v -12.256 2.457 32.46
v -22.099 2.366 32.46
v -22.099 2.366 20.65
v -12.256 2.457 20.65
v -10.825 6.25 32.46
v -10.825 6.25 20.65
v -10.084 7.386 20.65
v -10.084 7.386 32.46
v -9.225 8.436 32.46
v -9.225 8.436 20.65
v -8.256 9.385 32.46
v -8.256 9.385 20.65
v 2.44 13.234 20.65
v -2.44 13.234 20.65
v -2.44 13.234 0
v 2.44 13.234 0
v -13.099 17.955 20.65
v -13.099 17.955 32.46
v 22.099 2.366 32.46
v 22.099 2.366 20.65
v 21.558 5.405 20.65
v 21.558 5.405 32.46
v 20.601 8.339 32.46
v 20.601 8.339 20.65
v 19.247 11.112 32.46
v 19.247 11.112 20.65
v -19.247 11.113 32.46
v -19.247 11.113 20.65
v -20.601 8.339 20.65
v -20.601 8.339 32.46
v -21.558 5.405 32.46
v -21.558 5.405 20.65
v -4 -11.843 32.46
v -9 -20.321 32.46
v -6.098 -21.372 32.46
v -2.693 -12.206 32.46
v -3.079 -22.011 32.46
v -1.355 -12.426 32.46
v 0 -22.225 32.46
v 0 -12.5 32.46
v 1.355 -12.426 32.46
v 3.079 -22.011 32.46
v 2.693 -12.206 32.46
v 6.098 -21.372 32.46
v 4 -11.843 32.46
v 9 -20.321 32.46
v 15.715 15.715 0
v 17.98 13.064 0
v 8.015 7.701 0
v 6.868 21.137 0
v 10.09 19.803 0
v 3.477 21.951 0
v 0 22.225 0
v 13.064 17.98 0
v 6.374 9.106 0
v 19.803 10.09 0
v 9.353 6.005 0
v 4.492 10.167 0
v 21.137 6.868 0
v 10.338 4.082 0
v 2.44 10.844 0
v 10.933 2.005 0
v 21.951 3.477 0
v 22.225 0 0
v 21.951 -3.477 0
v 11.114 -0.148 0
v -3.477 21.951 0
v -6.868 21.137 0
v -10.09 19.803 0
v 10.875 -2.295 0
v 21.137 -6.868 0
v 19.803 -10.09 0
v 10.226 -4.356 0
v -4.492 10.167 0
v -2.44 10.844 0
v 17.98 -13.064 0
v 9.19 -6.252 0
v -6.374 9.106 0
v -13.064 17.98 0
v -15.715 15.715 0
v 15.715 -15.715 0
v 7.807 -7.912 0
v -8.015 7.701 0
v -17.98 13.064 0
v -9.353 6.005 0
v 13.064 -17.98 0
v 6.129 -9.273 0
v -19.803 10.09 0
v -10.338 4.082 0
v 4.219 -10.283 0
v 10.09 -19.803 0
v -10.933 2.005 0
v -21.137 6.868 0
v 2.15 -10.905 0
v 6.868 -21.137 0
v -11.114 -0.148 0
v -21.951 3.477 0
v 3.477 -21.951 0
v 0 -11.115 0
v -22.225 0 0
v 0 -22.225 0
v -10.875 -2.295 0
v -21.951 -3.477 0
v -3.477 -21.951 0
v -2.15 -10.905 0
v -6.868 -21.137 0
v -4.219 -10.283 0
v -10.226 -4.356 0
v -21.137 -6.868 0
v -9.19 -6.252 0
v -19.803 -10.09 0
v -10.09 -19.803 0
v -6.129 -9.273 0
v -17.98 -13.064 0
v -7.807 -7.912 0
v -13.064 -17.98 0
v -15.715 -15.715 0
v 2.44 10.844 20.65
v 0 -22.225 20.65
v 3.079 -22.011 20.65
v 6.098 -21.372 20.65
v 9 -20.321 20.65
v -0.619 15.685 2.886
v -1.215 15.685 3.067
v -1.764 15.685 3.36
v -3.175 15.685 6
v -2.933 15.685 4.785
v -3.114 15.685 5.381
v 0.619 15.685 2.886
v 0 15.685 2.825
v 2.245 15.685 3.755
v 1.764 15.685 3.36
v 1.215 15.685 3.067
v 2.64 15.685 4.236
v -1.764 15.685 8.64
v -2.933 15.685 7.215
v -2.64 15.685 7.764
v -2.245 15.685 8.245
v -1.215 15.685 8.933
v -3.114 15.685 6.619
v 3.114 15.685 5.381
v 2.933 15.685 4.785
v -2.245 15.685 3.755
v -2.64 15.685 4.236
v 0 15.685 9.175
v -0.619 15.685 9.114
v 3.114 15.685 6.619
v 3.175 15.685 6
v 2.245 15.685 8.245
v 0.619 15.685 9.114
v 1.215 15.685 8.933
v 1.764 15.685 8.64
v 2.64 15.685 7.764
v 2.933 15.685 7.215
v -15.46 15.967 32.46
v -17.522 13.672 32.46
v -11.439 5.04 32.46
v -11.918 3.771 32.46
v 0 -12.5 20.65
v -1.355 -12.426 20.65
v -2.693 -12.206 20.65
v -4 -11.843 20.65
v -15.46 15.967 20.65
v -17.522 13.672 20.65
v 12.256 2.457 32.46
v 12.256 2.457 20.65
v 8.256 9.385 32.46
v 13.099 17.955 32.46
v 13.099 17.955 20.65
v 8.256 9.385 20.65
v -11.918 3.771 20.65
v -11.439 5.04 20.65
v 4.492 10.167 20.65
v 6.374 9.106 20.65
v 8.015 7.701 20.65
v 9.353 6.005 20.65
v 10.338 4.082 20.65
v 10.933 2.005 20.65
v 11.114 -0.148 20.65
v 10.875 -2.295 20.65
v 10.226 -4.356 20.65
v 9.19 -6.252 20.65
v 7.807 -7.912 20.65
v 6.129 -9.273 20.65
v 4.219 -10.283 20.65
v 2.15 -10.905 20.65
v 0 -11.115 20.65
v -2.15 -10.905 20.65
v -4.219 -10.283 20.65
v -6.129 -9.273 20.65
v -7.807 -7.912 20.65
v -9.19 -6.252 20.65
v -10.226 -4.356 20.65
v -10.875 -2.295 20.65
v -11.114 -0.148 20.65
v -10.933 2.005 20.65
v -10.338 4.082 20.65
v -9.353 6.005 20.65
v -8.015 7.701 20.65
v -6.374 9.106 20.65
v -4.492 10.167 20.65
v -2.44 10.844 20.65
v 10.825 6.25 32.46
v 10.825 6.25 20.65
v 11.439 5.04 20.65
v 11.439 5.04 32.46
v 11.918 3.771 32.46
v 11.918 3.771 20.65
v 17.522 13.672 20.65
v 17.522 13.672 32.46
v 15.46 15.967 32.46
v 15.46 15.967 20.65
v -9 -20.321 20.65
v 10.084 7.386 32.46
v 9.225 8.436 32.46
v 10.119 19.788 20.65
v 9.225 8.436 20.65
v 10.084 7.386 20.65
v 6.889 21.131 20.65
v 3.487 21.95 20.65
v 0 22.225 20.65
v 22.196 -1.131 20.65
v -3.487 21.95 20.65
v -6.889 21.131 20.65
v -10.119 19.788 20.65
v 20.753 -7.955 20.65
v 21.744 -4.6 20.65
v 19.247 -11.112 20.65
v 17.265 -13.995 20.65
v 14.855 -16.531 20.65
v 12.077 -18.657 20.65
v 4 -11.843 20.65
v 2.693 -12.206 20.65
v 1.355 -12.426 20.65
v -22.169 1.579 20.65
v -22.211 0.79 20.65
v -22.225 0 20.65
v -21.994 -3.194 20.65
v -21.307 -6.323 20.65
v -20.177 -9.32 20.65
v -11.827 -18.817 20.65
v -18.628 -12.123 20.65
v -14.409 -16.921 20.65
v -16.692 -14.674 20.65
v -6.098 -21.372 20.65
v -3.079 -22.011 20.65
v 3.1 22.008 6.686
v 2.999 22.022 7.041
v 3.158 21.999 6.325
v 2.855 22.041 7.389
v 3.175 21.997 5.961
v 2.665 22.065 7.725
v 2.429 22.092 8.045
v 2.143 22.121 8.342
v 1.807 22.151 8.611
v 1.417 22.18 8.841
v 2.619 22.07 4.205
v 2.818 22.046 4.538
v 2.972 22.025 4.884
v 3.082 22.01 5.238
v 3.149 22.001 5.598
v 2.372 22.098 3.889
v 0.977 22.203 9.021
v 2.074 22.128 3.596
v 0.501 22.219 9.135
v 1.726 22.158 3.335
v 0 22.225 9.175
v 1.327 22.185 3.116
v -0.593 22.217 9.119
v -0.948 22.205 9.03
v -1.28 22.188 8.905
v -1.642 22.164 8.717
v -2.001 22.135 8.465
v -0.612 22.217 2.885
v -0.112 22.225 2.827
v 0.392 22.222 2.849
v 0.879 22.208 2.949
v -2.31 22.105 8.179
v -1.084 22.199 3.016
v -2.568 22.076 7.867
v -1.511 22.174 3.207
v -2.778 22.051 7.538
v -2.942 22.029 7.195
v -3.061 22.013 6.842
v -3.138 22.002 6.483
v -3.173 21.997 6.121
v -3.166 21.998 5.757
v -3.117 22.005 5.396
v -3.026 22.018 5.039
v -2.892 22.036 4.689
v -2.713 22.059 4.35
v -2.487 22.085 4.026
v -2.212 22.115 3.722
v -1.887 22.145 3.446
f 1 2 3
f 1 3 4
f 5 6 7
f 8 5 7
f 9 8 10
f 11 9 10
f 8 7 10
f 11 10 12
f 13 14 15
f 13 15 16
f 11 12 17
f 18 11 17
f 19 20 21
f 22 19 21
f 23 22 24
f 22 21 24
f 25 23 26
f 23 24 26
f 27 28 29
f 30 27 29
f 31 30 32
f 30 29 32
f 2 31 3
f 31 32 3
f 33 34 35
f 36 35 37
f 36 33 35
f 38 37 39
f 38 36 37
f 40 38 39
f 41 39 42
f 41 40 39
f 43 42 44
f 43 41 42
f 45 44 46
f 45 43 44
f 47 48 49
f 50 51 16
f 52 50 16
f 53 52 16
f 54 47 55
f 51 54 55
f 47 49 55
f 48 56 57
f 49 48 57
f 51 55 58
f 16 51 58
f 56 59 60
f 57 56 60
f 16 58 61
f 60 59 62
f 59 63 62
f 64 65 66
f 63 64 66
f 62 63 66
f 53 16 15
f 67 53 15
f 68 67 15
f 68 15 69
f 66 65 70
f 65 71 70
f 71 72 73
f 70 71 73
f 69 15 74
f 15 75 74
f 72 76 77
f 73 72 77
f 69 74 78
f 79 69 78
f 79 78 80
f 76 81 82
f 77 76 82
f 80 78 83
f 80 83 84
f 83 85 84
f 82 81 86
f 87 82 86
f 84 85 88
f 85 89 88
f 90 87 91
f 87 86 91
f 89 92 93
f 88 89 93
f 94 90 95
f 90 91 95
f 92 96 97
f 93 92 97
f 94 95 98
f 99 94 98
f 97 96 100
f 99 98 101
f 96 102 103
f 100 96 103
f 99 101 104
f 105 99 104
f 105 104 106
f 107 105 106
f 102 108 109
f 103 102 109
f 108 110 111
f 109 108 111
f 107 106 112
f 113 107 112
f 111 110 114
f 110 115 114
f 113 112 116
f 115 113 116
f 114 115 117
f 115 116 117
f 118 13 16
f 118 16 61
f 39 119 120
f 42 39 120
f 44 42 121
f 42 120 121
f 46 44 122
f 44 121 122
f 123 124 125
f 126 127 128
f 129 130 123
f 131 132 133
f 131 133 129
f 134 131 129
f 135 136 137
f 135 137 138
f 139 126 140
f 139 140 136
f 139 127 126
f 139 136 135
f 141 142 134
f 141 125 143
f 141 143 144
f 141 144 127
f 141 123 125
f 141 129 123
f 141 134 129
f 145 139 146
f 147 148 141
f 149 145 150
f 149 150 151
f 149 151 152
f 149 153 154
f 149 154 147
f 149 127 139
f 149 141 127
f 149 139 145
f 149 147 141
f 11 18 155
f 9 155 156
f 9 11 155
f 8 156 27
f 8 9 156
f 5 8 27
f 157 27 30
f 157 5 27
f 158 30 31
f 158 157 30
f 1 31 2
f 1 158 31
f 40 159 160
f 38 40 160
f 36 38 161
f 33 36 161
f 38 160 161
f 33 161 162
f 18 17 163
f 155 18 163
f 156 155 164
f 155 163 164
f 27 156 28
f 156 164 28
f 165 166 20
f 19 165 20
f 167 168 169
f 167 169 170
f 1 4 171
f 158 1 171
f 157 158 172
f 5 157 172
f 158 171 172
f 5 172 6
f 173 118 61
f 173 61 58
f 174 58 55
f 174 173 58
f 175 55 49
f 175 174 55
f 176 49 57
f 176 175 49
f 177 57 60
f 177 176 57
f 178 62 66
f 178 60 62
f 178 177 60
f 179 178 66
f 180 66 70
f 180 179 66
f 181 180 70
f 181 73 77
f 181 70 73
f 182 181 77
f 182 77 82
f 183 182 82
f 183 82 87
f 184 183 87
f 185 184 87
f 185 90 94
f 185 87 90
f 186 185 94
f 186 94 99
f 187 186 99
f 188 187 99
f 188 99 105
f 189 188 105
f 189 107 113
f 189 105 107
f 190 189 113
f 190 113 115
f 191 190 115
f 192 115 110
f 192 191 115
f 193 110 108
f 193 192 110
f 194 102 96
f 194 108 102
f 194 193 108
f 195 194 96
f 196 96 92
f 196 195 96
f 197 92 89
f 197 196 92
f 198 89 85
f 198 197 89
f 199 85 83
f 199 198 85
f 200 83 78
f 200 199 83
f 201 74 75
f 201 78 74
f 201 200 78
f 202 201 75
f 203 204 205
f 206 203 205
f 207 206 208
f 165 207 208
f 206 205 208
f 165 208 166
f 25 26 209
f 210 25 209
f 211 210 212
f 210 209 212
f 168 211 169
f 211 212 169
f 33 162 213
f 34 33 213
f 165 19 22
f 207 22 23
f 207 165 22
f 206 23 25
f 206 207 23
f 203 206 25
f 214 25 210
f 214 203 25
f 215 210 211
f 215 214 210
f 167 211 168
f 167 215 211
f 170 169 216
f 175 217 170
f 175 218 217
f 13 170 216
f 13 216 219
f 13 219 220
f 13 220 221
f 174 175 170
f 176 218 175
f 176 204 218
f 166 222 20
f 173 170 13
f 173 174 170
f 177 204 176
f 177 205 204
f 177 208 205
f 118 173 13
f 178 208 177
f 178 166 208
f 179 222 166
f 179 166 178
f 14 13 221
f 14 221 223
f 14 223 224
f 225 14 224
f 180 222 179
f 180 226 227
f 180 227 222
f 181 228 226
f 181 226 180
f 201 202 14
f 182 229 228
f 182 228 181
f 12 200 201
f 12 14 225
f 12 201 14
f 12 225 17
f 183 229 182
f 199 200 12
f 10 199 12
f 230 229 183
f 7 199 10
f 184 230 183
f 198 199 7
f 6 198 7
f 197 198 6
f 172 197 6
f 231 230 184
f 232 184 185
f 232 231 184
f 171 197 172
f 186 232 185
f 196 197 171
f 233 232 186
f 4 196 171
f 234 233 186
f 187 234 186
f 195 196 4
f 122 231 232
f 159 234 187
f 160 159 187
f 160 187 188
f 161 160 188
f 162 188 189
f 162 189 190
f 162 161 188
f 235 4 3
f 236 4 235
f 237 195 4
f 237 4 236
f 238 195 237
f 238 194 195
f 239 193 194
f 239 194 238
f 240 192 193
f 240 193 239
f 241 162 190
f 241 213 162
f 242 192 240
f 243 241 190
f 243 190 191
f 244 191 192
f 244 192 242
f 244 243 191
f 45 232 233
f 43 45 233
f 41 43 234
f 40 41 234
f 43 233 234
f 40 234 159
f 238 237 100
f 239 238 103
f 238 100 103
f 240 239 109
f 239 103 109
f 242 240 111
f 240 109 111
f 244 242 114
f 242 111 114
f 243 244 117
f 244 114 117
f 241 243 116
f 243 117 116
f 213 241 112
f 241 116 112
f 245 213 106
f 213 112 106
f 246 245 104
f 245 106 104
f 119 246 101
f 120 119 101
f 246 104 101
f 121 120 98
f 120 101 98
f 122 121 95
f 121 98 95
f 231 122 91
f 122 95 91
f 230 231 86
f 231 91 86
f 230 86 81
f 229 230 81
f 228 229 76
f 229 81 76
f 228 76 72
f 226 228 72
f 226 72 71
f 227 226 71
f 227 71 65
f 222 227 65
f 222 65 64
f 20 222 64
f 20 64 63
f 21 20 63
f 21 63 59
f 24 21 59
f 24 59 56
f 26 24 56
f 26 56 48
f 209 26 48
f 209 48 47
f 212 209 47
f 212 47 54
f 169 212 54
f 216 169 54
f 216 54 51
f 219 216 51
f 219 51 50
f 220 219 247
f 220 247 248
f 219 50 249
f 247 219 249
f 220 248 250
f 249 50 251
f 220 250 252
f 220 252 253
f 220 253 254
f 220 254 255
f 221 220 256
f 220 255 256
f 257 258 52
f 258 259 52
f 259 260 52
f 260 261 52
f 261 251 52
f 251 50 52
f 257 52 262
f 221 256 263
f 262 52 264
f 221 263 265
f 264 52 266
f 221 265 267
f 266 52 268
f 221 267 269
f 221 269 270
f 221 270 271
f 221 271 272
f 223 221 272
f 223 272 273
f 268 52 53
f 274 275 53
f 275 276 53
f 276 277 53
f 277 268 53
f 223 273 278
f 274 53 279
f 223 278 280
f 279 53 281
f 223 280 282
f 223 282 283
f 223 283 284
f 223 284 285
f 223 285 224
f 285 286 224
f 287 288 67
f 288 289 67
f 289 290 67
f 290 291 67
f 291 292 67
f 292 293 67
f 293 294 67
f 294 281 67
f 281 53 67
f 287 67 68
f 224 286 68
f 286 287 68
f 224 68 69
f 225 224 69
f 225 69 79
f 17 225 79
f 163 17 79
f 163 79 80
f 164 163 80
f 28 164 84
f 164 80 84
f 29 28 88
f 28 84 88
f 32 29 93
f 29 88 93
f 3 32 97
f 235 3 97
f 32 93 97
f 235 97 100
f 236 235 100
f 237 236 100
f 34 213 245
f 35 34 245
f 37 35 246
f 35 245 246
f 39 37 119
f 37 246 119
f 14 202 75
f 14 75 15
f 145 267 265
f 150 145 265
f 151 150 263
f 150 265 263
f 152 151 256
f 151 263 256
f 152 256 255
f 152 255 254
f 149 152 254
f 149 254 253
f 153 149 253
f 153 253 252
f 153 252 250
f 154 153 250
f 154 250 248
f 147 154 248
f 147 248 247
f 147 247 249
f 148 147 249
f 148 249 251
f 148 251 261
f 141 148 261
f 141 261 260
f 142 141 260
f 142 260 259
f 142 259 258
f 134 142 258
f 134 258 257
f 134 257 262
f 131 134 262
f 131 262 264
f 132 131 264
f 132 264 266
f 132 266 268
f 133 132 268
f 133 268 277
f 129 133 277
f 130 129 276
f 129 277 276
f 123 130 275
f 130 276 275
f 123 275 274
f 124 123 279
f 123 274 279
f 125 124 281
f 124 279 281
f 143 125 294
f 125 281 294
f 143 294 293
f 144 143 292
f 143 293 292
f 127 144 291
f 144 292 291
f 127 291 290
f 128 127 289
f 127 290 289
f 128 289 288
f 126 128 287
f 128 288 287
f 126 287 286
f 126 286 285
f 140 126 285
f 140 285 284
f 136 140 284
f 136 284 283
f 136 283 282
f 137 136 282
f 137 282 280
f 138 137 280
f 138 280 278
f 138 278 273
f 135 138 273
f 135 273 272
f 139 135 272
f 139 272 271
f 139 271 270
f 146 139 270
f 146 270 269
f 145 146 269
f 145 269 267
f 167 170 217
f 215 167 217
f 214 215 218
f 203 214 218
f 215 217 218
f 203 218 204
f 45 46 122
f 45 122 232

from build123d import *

# Parameters (mm, degrees)
SZKIC1_R                    = 22.225
DODANIE_WYCI_GNI_CIE1_DEPTH = 20.65
WYTNIJ_WYCI_GNI_CIE1_REACH  = 39.607
DODANIE_WYCI_GNI_CIE2_DEPTH = 11.81
SZYK_KO_OWY1_COUNT          = 3
SZKIC4_R                    = 3.175
WYTNIJ_WYCI_GNI_CIE2_DEPTH  = 6.54


with BuildPart() as part:
    # Szkic1 → Dodanie-wyciągnięcie1 (new body)
    with BuildSketch(Plane.XY):
        with Locations(Location((0, 0, 0), (0, 0, 180))):
            Circle(SZKIC1_R)
    extrude(amount=DODANIE_WYCI_GNI_CIE1_DEPTH)

    # Szkic2 → Wytnij-wyciągnięcie1 (cut, up to next)
    with BuildSketch(Plane.XY.offset(20.65), mode=Mode.PRIVATE) as wytnij_wyci_gni_cie1_sk1:
        with BuildLine():
            Line((-2.44, 13.233874999), (2.44, 13.233874999))
            Line((2.44, 13.233874999), (2.44, 10.843874999))
            ThreePointArc((2.44, 10.843874999), (0, -11.115), (-2.44, 10.843874999))
            Line((-2.44, 10.843874999), (-2.44, 13.233874999))
        make_face()
    wytnij_wyci_gni_cie1_tool1 = extrude(wytnij_wyci_gni_cie1_sk1.sketch, amount=-WYTNIJ_WYCI_GNI_CIE1_REACH, mode=Mode.PRIVATE) & part.part
    add(wytnij_wyci_gni_cie1_tool1.solids().sort_by_distance((0, 0.327718, 20.65))[0], mode=Mode.SUBTRACT)

    # Szkic3 → Dodanie-wyciągnięcie2 (add)
    with BuildSketch(Plane.XY.offset(20.65)):
        with BuildLine():
            ThreePointArc((0, -12.5), (-2.026821276, -12.33458534), (-4, -11.842719282))
            Line((-4, -11.842719282), (-9, -20.321186604))
            ThreePointArc((-9, -20.321186604), (-4.599578933, -21.743838176), (0, -22.225))
            Line((0, -22.225), (0, -12.5))
        make_face()
        with BuildLine():
            ThreePointArc((4, -11.842719282), (2.026821276, -12.33458534), (0, -12.5))
            Line((0, -12.5), (0, -22.225))
            ThreePointArc((0, -22.225), (4.599578933, -21.743838176), (9, -20.321186604))
            Line((9, -20.321186604), (4, -11.842719282))
        make_face()
    dodanie_wyci_gni_cie2 = extrude(amount=DODANIE_WYCI_GNI_CIE2_DEPTH)

    # Szyk kołowy1: Dodanie-wyciągnięcie2 ×3 about axis
    szyk_ko_owy1_axis = Axis((0, 0, 0), (0, 0, 1))
    for i in range(1, SZYK_KO_OWY1_COUNT):
        add(dodanie_wyci_gni_cie2.rotate(szyk_ko_owy1_axis, i * 360 / SZYK_KO_OWY1_COUNT))

    # Szkic4 → Wytnij-wyciągnięcie2 (cut)
    with BuildSketch(Plane(origin=(0, 22.225, 0), x_dir=(1, 0, 0), z_dir=(0, 1, 0))):
        with Locations(Location((0, -6, 0), (0, 0, 270))):
            Circle(SZKIC4_R)
    extrude(amount=-WYTNIJ_WYCI_GNI_CIE2_DEPTH, mode=Mode.SUBTRACT)


solid = part.part
